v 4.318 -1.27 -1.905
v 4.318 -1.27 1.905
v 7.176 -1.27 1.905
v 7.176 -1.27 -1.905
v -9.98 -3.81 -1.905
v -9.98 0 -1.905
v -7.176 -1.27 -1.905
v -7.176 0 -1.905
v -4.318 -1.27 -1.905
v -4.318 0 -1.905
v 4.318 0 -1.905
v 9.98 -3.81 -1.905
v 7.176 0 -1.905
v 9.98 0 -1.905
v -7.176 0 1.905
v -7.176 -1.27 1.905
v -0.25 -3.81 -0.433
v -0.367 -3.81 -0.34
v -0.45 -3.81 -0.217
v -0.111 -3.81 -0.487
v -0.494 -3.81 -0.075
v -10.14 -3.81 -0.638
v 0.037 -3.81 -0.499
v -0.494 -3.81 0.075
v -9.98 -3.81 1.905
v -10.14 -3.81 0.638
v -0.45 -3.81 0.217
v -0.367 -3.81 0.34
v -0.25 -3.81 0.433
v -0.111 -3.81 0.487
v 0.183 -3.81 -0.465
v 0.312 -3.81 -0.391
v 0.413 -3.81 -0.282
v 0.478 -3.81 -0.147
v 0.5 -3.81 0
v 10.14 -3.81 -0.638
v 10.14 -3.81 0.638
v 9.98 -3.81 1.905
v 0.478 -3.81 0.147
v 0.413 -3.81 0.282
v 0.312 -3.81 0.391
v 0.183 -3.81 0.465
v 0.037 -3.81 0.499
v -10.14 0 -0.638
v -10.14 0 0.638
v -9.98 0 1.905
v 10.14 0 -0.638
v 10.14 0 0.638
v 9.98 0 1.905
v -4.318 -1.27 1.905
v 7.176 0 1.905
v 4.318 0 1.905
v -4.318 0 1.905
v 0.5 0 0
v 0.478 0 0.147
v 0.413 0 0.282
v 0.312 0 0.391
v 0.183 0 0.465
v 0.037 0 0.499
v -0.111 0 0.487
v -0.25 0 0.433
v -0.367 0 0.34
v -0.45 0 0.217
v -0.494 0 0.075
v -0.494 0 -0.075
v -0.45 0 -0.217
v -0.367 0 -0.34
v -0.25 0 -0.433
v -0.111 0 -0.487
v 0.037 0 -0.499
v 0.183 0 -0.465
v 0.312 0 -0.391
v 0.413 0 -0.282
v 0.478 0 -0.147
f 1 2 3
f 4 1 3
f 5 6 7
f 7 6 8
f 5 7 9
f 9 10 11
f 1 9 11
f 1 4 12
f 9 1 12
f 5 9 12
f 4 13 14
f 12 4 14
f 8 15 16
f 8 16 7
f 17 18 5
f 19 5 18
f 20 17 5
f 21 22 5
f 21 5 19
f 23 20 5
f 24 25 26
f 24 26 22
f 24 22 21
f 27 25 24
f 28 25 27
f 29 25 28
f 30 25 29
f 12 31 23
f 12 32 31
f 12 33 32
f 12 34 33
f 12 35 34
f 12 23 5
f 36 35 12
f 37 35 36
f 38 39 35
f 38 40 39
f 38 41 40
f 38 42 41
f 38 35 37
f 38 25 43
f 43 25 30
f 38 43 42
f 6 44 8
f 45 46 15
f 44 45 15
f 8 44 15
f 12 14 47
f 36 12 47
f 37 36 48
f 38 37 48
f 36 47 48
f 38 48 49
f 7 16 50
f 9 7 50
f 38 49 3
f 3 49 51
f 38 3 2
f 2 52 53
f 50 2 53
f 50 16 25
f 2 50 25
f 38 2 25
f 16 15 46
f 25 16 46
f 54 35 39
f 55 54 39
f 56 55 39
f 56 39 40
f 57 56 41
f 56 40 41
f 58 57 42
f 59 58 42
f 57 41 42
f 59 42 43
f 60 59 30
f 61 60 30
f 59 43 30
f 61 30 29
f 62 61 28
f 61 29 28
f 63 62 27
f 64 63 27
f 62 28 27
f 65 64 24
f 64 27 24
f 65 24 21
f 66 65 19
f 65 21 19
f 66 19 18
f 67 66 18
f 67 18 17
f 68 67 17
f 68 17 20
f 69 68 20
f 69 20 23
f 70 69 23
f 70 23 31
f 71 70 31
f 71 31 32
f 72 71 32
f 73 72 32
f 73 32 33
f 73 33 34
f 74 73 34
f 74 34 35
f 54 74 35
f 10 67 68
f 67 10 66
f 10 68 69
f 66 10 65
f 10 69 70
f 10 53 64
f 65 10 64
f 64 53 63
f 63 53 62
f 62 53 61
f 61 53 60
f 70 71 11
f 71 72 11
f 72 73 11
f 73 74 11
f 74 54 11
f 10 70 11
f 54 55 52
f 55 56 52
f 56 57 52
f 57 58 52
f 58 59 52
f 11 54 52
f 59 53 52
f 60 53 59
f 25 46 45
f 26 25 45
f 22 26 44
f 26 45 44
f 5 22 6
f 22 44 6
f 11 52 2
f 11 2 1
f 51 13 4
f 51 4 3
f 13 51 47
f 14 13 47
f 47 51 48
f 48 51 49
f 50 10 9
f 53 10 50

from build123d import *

# Parameters (mm, degrees)
F1_DEPTH = 3.81
F2_R     = 0.5
F3_DEPTH = 25.4
F5_DEPTH = 1.27


# Not quite as in the source:
# - ends of sketch curves that miss each other by under 0.0002 mm in the source are joined


with BuildPart() as f1:
    # F0 (on Front) → F1 (new body)
    with BuildSketch(Plane.XZ):
        with BuildLine():
            Line((9.9798112172, 1.905), (-9.9798084652, 1.905))
            ThreePointArc((-9.9798084652, 1.905), (-10.16, 0), (-9.9798084652, -1.9049994747))
            Line((-9.9798084652, -1.9049994747), (9.9798084652, -1.905))
            ThreePointArc((9.9798084652, -1.905), (10.16, 0), (9.9798112172, 1.905))
        make_face()
    extrude(amount=F1_DEPTH)

    # F2 (on face) → F3 (cut)
    with BuildSketch(Plane.XZ.offset(3.81)):
        Circle(F2_R)
    extrude(amount=-F3_DEPTH, mode=Mode.SUBTRACT)

    # F4 (on face) → F5 (cut)
    with BuildSketch(Plane.XZ):
        Polygon((7.1755, 1.905), (4.318, 1.905), (4.318, -0.0512809254), (4.318, -1.905), (7.1755, -1.905), align=None)
        Polygon((-4.318, 0), (-4.318, 1.905), (-7.1755, 1.905), (-7.1755, -1.905), (-4.318, -1.905), align=None)
    extrude(amount=F5_DEPTH, mode=Mode.SUBTRACT)


solid = f1.part
